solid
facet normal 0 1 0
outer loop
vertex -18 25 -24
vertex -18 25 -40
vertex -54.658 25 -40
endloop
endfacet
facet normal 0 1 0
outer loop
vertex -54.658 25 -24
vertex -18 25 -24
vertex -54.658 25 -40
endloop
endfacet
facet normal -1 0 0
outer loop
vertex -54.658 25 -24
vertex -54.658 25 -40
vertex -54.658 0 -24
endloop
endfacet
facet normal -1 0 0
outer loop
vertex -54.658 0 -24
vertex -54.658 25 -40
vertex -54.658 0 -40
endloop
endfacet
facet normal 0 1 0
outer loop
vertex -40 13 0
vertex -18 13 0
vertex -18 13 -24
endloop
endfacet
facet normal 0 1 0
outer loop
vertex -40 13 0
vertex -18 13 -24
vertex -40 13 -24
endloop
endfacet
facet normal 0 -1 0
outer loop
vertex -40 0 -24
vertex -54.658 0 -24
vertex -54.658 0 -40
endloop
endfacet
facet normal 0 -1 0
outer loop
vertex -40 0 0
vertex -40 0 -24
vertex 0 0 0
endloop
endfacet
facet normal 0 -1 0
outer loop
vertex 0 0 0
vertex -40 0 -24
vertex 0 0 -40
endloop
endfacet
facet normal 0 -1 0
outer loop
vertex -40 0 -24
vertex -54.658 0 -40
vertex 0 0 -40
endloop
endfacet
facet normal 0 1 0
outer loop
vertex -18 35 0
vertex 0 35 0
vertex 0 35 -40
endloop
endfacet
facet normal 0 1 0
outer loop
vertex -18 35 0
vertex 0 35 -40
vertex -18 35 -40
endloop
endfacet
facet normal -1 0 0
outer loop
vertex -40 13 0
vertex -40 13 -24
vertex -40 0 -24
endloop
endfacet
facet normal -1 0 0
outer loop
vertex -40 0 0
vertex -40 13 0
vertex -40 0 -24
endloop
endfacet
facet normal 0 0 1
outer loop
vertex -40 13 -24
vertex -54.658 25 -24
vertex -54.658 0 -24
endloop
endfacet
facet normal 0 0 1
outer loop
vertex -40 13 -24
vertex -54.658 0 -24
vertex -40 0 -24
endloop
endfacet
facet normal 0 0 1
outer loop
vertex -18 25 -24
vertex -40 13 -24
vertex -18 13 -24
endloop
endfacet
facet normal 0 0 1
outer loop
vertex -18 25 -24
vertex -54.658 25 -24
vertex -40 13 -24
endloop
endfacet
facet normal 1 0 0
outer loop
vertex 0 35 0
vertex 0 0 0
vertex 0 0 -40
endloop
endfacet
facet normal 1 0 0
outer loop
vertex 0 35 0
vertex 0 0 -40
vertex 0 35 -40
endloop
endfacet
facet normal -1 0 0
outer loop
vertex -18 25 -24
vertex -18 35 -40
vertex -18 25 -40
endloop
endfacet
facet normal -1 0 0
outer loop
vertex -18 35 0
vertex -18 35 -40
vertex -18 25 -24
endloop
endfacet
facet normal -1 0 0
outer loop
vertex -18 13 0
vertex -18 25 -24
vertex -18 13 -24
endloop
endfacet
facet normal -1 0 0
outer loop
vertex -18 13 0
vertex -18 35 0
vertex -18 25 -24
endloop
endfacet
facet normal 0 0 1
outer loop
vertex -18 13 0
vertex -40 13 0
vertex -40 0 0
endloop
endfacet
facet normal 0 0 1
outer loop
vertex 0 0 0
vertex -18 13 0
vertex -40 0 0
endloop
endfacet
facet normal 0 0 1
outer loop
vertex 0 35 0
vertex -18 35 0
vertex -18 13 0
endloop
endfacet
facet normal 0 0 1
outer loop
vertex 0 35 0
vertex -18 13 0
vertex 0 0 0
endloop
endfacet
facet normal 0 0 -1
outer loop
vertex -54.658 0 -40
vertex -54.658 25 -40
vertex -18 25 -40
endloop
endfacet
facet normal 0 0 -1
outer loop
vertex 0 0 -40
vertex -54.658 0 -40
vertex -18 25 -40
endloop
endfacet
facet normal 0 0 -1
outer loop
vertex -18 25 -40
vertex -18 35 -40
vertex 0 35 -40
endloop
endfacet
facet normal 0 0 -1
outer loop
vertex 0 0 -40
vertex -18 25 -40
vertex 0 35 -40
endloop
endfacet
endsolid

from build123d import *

# Parameters (mm, degrees)
BOSS_EXTRUDE1_DEPTH = 40
BOSS_EXTRUDE2_DEPTH = 16


with BuildPart() as part:
    # Sketch1 → Boss-Extrude1 (new body)
    with BuildSketch(Plane.XY):
        Polygon((0, 0), (0, 35), (-18, 35), (-18, 13), (-40, 13), (-40, 0), align=None)
    extrude(amount=-BOSS_EXTRUDE1_DEPTH)

    # Sketch2 → Boss-Extrude2 (add)
    with BuildSketch(Plane(origin=(0, 0, -40), x_dir=(-1, 0, 0), z_dir=(0, 0, -1))):
        Polygon((18, 13), (18, 25), (54.657821702, 25), (54.657821702, 0), (40, 0), (40, 13), align=None)
    extrude(amount=-BOSS_EXTRUDE2_DEPTH)


solid = part.part
